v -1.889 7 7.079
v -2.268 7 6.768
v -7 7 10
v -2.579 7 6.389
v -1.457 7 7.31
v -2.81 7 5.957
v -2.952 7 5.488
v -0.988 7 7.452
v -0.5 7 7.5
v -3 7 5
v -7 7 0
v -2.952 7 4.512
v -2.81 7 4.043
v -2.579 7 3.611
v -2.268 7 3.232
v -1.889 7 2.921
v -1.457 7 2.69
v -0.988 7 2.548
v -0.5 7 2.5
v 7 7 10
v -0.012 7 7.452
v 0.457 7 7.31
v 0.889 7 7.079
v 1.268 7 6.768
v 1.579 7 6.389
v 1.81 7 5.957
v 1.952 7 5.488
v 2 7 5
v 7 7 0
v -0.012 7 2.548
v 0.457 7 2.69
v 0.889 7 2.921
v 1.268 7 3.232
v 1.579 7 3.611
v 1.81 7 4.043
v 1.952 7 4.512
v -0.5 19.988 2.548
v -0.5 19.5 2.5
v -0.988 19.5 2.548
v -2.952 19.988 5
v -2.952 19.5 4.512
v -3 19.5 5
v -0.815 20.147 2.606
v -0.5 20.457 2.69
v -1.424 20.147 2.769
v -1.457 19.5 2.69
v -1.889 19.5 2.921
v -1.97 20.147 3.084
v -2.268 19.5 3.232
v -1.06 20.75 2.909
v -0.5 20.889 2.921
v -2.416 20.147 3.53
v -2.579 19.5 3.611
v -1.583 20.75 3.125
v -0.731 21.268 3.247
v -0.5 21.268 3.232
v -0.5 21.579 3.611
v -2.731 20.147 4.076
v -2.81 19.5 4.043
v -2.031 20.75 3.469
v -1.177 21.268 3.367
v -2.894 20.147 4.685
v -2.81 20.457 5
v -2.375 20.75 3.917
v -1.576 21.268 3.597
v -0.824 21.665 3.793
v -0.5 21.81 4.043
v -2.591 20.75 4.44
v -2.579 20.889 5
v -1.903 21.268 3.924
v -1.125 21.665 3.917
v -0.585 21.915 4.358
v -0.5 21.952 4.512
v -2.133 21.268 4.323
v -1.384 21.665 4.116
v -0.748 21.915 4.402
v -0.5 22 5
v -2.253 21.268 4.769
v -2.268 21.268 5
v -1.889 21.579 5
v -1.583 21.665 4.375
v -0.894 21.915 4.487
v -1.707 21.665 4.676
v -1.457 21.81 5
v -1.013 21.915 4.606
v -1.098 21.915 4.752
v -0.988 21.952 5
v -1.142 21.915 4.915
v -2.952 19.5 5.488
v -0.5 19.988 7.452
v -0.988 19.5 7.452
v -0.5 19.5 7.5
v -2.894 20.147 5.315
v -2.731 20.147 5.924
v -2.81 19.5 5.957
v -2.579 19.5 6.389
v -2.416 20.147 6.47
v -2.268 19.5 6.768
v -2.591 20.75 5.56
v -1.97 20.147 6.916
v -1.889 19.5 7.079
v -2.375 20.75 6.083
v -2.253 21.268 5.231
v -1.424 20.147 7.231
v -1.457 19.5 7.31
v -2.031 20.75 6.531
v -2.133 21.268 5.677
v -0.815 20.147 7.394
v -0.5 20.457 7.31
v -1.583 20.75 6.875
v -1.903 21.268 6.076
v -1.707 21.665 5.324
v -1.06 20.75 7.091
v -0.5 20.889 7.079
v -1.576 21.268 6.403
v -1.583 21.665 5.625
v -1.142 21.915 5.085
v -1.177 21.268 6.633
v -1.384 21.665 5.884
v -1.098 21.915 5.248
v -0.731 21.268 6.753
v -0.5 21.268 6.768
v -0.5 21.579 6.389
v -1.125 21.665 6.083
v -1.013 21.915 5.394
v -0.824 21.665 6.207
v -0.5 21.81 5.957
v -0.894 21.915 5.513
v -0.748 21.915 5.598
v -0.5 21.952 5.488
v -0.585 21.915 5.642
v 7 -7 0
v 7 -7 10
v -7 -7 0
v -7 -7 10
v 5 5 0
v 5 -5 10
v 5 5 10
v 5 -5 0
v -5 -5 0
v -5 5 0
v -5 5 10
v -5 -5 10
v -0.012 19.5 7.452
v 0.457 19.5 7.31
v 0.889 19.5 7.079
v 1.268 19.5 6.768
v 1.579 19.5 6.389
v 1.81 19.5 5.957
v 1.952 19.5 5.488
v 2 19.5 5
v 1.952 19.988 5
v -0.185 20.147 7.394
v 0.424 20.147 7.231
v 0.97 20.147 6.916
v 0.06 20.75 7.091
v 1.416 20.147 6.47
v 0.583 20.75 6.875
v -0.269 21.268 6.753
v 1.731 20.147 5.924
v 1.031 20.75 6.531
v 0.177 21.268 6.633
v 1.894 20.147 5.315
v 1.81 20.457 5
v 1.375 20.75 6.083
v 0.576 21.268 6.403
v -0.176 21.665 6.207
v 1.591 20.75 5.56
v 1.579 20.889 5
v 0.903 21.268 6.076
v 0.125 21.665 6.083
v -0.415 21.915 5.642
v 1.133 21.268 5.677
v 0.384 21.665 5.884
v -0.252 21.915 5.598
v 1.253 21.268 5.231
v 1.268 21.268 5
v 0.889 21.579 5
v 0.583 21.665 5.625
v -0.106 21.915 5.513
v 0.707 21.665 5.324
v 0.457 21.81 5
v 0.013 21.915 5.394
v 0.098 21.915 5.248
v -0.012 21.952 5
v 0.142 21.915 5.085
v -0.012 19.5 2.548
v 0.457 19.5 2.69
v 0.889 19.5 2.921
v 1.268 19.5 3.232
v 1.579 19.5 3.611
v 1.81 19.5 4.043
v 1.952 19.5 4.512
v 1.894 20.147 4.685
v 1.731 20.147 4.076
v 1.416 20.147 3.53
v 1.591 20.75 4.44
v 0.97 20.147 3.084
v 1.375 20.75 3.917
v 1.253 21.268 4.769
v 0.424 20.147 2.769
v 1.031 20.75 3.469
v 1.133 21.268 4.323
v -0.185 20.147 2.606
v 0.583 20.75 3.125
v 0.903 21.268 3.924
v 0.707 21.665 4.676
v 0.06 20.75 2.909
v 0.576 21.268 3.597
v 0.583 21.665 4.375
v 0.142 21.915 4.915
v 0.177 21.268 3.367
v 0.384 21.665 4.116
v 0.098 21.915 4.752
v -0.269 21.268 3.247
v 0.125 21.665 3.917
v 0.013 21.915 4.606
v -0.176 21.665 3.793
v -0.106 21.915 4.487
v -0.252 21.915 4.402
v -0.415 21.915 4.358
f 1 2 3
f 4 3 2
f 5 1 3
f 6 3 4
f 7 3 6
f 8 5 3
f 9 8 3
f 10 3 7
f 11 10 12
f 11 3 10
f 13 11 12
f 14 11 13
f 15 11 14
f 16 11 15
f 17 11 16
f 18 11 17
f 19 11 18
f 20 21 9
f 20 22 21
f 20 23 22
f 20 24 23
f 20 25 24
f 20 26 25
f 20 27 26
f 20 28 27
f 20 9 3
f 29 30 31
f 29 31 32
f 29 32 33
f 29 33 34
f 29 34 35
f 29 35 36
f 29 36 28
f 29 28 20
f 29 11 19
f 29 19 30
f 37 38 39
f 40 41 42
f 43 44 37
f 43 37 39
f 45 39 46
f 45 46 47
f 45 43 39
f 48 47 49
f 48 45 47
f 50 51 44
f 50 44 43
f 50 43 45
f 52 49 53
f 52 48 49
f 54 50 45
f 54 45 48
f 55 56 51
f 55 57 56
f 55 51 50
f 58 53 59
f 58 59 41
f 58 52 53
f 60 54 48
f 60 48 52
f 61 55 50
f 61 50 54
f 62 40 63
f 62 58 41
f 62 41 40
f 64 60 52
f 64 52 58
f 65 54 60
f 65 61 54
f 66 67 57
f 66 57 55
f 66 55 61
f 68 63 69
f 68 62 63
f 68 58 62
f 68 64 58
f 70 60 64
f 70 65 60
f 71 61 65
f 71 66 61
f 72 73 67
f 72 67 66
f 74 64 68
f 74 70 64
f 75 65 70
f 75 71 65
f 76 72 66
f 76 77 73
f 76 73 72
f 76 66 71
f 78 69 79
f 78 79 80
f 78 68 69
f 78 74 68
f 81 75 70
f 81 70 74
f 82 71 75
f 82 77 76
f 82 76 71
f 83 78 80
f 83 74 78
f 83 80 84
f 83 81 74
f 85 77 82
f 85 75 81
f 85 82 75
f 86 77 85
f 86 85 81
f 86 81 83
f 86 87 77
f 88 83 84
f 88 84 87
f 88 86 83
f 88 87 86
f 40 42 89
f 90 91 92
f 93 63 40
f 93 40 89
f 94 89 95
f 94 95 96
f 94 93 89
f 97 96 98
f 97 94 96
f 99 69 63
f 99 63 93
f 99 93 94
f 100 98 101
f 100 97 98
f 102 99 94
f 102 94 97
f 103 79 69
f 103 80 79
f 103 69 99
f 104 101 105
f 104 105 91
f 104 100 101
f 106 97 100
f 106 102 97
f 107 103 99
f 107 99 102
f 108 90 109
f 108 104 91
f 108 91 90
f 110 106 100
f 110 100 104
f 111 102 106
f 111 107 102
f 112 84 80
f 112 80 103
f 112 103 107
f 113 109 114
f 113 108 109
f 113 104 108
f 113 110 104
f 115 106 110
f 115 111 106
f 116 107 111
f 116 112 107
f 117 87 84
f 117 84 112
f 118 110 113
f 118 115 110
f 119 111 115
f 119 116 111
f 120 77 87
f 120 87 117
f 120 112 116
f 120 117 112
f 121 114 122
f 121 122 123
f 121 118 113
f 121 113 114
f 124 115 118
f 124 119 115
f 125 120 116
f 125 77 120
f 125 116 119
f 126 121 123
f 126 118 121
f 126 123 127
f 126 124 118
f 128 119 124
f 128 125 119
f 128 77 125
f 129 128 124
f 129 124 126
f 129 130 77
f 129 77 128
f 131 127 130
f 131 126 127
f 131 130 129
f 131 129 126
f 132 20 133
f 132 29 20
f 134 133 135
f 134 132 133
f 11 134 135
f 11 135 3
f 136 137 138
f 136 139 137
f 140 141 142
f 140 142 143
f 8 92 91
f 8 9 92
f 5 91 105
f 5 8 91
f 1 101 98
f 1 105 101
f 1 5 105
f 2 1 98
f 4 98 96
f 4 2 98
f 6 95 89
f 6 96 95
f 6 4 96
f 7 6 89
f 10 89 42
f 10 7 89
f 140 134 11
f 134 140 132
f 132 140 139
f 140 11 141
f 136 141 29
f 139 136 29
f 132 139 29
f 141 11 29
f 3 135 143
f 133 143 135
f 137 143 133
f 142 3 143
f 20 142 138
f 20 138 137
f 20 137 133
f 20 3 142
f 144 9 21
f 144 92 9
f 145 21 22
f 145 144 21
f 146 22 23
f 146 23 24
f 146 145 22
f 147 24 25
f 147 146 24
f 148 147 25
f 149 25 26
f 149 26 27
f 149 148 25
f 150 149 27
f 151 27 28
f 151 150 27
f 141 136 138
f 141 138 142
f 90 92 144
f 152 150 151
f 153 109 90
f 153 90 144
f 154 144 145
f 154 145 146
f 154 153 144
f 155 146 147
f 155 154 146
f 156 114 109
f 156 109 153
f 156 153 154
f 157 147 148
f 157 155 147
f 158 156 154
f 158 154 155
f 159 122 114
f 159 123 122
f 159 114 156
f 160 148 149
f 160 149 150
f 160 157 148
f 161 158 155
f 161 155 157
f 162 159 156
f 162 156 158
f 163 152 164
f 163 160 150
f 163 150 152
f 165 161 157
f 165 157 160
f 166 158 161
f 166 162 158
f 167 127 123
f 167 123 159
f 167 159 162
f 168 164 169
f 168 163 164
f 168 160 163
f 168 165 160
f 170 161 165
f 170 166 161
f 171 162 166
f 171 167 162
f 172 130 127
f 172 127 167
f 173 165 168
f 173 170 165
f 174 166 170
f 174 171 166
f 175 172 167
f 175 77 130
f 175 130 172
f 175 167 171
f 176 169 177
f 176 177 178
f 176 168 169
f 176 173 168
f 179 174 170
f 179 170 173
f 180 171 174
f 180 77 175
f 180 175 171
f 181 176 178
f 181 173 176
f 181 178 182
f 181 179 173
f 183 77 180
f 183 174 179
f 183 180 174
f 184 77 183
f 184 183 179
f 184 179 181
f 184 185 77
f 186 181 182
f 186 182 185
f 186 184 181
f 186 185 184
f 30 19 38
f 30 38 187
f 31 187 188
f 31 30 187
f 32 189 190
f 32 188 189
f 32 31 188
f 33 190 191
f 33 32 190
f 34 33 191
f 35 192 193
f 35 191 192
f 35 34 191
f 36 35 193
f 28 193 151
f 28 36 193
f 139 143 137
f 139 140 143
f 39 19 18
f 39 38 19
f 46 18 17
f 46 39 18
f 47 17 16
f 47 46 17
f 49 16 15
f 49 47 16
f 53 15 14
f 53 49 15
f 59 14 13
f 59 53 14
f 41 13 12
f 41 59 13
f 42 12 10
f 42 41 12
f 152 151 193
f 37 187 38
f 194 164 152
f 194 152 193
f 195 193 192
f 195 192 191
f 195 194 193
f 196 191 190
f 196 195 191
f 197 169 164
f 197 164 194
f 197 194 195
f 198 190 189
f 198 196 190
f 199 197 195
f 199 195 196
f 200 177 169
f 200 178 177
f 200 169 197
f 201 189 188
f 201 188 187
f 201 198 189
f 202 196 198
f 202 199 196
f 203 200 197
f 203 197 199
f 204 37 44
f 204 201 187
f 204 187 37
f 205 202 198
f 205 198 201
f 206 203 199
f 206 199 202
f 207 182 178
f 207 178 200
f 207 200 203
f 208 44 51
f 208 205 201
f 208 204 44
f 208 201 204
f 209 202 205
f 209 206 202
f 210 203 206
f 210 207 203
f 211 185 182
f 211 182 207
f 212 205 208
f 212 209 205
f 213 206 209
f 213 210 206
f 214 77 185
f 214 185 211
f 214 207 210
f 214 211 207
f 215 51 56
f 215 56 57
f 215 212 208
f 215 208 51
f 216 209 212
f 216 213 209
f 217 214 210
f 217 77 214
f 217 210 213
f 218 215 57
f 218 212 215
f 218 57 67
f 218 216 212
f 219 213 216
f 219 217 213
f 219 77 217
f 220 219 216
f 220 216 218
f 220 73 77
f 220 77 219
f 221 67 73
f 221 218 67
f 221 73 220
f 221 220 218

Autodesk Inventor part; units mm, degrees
ref_plane "YZ Plane" through (0, 0, 0) normal (1, 0, 0) x (0, 1, 0)
ref_plane "XZ Plane" through (0, 0, 0) normal (0, 1, 0) x (-1, 0, 0)
ref_plane "XY Plane" through (0, 0, 0) normal (0, 0, 1) x (1, 0, 0)
sketch "草圖1" plane through (0, 0, 0) normal (0, 0, 1) x (1, 0, 0)
  line L0 (-5, -5) -> (5, -5)
  line L1 (5, -5) -> (5, 5)
  line L2 (5, 5) -> (-5, 5)
  line L3 (-5, 5) -> (-5, -5)
  line L4 (-5, -5) -> (5, 5) construction
  line L5 (5, -5) -> (-5, 5) construction
  line L6 (-7, 7) -> (7, 7)
  line L7 (7, 7) -> (7, -7)
  line L8 (7, -7) -> (-7, -7)
  line L9 (-7, -7) -> (-7, 7)
  point P0 (0, 0)
  dimension "d0" = 10
  dimension "d1" = 10
  dimension "d2" = 2
extrude "擠出1" add sketch "草圖1" along normal blind 10
sketch "草圖2" plane through (-7, 7, 0) normal (0, 1, 0) x (1, 0, 0)
  line L0 (2, -10) -> (12, -10) projected
  line L1 (12, 0) -> (2, 0) projected
  line L2 (4, -10) -> (9, -10)
  line L3 (9, -10) -> (9, 0)
  line L4 (9, 0) -> (4, 0)
  line L5 (4, 0) -> (4, -10)
  line L6 (14, 0) -> (14, -10) projected
  point P0 (7, 0)
  dimension "d5" = 5
  dimension "d6" = 5
extrude "擠出2" add sketch "草圖2" along normal blind 15
sketch "草圖3" plane through (0, 0, 10) normal (0, 0, 1) x (1, 0, 0)
  line L0 (-7, 7) -> (-3, 7) projected
  line L1 (-7, 7) -> (8.7829, 7)
  line L2 (8.7829, 7) -> (8.7829, 28.6907)
  line L3 (8.7829, 28.6907) -> (-7, 28.6907)
  line L4 (-7, 28.6907) -> (-7, 7)
  point P0 (0, 0)
extrude "擠出3" cut sketch "草圖3" against normal blind 2.5
sketch "草圖4" plane through (0, 0, 0) normal (0, 0, -1) x (-1, 0, 0)
  line L0 (-2, 7) -> (-7, 7) projected
  line L1 (-3.5131, 7) -> (8.3925, 7)
  line L2 (8.3925, 7) -> (8.3925, 27.422)
  line L3 (8.3925, 27.422) -> (-3.5131, 27.422)
  line L4 (-3.5131, 27.422) -> (-3.5131, 7)
  point P0 (0, 0)
extrude "擠出4" cut sketch "草圖4" against normal blind 2.5
fillet "圓角2" radius 2.5 4 edges at (-3, 14.5, 7.5) (2, 14.5, 7.5) (2, 14.5, 2.5) (-3, 14.5, 2.5)
fillet "圓角3" radius 2.5 3 edges at (-3, 22, 5) (-2.2678, 22, 6.7678) (-0.5, 22, 7.5)
properties part number "軸滑塊"
